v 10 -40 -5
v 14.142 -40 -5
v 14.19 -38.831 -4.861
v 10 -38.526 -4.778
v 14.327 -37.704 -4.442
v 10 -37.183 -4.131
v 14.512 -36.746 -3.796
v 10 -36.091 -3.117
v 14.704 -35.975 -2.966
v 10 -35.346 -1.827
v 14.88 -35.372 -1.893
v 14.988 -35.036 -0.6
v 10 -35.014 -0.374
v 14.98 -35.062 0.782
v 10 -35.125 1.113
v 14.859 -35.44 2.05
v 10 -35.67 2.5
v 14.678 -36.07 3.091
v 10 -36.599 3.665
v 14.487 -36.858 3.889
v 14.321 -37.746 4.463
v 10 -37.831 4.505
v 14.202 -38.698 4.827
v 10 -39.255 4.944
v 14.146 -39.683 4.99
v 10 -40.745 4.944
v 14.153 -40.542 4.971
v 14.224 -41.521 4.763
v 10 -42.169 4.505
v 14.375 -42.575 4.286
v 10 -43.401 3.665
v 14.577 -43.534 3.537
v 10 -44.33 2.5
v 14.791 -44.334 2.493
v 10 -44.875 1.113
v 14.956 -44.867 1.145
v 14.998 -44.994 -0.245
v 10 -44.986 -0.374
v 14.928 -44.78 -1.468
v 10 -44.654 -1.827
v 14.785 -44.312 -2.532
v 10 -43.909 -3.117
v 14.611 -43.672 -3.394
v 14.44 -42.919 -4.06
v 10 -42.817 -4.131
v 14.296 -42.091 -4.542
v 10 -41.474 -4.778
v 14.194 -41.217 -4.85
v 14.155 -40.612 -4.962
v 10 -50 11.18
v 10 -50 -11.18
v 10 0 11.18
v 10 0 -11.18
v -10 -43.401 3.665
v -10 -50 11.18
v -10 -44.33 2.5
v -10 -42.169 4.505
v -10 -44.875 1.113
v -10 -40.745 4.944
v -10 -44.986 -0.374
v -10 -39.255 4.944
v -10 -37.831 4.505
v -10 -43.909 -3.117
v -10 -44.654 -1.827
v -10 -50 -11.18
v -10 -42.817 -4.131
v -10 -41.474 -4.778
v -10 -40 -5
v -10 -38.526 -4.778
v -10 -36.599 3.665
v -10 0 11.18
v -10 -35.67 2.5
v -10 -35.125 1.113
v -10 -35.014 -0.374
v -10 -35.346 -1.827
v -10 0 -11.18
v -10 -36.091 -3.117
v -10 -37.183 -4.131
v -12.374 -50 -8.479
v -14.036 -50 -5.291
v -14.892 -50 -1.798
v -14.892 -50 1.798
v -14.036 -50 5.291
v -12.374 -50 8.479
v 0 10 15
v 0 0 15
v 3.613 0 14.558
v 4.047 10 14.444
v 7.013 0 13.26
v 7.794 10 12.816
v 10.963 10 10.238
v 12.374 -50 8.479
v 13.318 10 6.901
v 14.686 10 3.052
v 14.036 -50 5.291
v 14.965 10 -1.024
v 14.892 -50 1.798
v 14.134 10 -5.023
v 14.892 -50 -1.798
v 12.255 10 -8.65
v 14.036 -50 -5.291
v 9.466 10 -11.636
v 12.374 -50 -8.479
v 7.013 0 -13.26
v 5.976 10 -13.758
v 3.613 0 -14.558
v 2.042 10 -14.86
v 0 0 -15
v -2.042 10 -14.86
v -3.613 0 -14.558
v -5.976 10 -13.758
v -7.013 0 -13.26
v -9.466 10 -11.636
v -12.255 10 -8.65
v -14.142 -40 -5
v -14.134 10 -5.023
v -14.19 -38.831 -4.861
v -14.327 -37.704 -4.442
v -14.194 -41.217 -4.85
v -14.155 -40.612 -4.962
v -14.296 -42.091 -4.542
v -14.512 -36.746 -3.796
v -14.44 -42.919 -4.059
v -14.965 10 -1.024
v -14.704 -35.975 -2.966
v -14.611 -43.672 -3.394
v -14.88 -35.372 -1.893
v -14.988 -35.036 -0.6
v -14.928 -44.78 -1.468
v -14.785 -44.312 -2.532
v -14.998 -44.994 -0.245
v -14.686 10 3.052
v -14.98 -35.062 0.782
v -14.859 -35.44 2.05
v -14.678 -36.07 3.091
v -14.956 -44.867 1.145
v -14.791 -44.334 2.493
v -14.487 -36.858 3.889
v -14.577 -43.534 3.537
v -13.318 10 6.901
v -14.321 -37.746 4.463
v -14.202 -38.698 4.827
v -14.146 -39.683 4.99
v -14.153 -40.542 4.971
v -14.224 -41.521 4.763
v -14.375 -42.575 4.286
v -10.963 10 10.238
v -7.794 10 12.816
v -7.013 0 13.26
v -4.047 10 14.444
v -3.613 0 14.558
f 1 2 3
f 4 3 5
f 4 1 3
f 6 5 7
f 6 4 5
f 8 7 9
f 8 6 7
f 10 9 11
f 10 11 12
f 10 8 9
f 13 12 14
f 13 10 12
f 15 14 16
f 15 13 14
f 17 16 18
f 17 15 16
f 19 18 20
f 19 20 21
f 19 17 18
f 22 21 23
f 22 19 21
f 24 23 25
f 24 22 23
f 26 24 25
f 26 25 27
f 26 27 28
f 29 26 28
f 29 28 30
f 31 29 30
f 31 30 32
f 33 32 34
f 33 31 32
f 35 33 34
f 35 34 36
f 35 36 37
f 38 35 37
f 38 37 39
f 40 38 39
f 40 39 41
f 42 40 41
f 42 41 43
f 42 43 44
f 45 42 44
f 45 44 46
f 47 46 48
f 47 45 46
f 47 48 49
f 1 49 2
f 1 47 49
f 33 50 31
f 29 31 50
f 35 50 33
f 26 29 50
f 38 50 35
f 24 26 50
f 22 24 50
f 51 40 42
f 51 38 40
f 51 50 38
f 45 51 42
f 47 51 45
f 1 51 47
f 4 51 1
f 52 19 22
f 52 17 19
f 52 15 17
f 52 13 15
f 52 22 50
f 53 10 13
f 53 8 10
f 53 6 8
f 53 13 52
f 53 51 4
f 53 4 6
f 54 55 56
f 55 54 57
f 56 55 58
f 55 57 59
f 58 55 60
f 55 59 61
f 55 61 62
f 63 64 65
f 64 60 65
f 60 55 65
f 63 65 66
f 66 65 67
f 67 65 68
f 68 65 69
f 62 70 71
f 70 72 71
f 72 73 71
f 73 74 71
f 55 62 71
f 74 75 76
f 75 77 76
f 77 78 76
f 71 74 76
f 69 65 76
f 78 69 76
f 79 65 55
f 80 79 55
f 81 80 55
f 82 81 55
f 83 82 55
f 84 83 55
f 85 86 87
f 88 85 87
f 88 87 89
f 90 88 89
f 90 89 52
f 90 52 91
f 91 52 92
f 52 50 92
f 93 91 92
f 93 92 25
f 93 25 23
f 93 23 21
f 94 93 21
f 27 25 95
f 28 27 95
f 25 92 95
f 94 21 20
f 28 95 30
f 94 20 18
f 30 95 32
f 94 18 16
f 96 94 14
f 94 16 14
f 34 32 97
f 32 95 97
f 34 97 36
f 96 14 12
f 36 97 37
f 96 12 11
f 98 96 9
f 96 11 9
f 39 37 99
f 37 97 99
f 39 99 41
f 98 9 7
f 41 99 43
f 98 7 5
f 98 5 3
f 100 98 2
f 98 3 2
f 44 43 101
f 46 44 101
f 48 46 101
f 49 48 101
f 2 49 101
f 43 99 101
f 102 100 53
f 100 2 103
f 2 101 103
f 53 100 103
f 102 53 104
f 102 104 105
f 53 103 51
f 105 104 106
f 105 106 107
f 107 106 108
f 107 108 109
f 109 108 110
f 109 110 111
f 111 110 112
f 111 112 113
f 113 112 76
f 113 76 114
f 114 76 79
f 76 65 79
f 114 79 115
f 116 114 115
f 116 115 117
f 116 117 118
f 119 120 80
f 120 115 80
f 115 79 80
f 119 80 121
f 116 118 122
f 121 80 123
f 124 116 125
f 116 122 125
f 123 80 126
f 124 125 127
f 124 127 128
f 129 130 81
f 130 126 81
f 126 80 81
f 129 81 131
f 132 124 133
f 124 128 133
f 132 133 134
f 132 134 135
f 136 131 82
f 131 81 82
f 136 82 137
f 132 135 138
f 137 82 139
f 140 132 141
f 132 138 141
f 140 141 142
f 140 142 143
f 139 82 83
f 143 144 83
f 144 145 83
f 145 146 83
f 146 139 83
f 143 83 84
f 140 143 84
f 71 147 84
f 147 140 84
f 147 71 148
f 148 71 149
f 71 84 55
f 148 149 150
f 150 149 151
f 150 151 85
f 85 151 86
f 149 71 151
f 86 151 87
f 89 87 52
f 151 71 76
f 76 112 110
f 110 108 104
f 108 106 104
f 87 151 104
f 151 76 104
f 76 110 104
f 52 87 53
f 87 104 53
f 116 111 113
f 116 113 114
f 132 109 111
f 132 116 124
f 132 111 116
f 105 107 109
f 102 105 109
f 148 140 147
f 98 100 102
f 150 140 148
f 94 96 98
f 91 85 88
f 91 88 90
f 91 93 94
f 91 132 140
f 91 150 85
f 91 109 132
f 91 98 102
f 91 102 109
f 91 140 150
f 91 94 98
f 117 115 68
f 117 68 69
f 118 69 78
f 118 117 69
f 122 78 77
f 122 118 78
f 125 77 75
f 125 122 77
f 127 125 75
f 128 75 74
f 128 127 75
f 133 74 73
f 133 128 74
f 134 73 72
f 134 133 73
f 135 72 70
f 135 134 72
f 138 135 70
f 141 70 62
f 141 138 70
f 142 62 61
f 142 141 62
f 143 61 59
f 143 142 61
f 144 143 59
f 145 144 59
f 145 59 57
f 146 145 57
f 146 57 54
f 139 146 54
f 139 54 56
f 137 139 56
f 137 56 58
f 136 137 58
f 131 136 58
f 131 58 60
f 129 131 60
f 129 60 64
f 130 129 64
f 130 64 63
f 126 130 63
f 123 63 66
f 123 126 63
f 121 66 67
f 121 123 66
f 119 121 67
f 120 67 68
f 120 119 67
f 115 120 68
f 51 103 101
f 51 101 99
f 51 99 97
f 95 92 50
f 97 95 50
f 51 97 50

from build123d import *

# Parameters (mm, degrees)
SKIZZE1_R                            = 15
AUFSATZ_LINEAR_AUSTRAGEN1_DEPTH      = 10
AUFSATZ_LINEAR_START                 = -50
SKIZZE4_R                            = 15
AUFSATZ_LINEAR_AUSTRAGEN3_DEPTH      = 50
SCHNITT_LINEAR_AUSTRAGEN1_DEPTH      = 55.313902456
SCHNITT_LINEAR_AUSTRAGEN1_DEPTH_BACK = 55.313902456
SKIZZE5_W                            = 20
SKIZZE5_H                            = 50
SCHNITT_LINEAR_AUSTRAGEN2_DEPTH      = 55.313902456
SCHNITT_LINEAR_AUSTRAGEN2_DEPTH_BACK = 55.313902456
SKIZZE6_R                            = 5


with BuildPart() as part:
    # Skizze1 → Aufsatz-Linear austragen1 (new body)
    with BuildSketch(Plane(origin=(0, 0, 0), x_dir=(1, 0, 0), z_dir=(0, 1, 0))):
        with Locations(Location((0, 0, 0), (0, 0, 270))):
            Circle(SKIZZE1_R)
    extrude(amount=AUFSATZ_LINEAR_AUSTRAGEN1_DEPTH)

    # Skizze4 → Aufsatz-Linear austragen3 (add)
    with BuildSketch(Plane(origin=(0, 0, 0), x_dir=(1, 0, 0), z_dir=(0, 1, 0)).offset(AUFSATZ_LINEAR_START)):
        with Locations(Location((0, 0, 0), (0, 0, 270))):
            Circle(SKIZZE4_R)
    extrude(amount=AUFSATZ_LINEAR_AUSTRAGEN3_DEPTH)

    # Skizze5 → Schnitt-Linear austragen1 (cut, two sides: drawn at the far end of the back side and taken through both)
    with BuildSketch(Plane.XY.offset(-SCHNITT_LINEAR_AUSTRAGEN1_DEPTH_BACK)):
        with Locations((0, -25)):
            Rectangle(SKIZZE5_W, SKIZZE5_H)
    extrude(amount=SCHNITT_LINEAR_AUSTRAGEN1_DEPTH + SCHNITT_LINEAR_AUSTRAGEN1_DEPTH_BACK, mode=Mode.SUBTRACT)

    # Skizze6 → Schnitt-Linear austragen2 (cut, two sides: drawn at the far end of the back side and taken through both)
    with BuildSketch(Plane(origin=(0, 0, 0), x_dir=(0, 0, -1), z_dir=(1, 0, 0)).offset(-SCHNITT_LINEAR_AUSTRAGEN2_DEPTH_BACK)):
        with Locations((0, -40)):
            Circle(SKIZZE6_R)
    extrude(amount=SCHNITT_LINEAR_AUSTRAGEN2_DEPTH + SCHNITT_LINEAR_AUSTRAGEN2_DEPTH_BACK, mode=Mode.SUBTRACT)


solid = part.part
